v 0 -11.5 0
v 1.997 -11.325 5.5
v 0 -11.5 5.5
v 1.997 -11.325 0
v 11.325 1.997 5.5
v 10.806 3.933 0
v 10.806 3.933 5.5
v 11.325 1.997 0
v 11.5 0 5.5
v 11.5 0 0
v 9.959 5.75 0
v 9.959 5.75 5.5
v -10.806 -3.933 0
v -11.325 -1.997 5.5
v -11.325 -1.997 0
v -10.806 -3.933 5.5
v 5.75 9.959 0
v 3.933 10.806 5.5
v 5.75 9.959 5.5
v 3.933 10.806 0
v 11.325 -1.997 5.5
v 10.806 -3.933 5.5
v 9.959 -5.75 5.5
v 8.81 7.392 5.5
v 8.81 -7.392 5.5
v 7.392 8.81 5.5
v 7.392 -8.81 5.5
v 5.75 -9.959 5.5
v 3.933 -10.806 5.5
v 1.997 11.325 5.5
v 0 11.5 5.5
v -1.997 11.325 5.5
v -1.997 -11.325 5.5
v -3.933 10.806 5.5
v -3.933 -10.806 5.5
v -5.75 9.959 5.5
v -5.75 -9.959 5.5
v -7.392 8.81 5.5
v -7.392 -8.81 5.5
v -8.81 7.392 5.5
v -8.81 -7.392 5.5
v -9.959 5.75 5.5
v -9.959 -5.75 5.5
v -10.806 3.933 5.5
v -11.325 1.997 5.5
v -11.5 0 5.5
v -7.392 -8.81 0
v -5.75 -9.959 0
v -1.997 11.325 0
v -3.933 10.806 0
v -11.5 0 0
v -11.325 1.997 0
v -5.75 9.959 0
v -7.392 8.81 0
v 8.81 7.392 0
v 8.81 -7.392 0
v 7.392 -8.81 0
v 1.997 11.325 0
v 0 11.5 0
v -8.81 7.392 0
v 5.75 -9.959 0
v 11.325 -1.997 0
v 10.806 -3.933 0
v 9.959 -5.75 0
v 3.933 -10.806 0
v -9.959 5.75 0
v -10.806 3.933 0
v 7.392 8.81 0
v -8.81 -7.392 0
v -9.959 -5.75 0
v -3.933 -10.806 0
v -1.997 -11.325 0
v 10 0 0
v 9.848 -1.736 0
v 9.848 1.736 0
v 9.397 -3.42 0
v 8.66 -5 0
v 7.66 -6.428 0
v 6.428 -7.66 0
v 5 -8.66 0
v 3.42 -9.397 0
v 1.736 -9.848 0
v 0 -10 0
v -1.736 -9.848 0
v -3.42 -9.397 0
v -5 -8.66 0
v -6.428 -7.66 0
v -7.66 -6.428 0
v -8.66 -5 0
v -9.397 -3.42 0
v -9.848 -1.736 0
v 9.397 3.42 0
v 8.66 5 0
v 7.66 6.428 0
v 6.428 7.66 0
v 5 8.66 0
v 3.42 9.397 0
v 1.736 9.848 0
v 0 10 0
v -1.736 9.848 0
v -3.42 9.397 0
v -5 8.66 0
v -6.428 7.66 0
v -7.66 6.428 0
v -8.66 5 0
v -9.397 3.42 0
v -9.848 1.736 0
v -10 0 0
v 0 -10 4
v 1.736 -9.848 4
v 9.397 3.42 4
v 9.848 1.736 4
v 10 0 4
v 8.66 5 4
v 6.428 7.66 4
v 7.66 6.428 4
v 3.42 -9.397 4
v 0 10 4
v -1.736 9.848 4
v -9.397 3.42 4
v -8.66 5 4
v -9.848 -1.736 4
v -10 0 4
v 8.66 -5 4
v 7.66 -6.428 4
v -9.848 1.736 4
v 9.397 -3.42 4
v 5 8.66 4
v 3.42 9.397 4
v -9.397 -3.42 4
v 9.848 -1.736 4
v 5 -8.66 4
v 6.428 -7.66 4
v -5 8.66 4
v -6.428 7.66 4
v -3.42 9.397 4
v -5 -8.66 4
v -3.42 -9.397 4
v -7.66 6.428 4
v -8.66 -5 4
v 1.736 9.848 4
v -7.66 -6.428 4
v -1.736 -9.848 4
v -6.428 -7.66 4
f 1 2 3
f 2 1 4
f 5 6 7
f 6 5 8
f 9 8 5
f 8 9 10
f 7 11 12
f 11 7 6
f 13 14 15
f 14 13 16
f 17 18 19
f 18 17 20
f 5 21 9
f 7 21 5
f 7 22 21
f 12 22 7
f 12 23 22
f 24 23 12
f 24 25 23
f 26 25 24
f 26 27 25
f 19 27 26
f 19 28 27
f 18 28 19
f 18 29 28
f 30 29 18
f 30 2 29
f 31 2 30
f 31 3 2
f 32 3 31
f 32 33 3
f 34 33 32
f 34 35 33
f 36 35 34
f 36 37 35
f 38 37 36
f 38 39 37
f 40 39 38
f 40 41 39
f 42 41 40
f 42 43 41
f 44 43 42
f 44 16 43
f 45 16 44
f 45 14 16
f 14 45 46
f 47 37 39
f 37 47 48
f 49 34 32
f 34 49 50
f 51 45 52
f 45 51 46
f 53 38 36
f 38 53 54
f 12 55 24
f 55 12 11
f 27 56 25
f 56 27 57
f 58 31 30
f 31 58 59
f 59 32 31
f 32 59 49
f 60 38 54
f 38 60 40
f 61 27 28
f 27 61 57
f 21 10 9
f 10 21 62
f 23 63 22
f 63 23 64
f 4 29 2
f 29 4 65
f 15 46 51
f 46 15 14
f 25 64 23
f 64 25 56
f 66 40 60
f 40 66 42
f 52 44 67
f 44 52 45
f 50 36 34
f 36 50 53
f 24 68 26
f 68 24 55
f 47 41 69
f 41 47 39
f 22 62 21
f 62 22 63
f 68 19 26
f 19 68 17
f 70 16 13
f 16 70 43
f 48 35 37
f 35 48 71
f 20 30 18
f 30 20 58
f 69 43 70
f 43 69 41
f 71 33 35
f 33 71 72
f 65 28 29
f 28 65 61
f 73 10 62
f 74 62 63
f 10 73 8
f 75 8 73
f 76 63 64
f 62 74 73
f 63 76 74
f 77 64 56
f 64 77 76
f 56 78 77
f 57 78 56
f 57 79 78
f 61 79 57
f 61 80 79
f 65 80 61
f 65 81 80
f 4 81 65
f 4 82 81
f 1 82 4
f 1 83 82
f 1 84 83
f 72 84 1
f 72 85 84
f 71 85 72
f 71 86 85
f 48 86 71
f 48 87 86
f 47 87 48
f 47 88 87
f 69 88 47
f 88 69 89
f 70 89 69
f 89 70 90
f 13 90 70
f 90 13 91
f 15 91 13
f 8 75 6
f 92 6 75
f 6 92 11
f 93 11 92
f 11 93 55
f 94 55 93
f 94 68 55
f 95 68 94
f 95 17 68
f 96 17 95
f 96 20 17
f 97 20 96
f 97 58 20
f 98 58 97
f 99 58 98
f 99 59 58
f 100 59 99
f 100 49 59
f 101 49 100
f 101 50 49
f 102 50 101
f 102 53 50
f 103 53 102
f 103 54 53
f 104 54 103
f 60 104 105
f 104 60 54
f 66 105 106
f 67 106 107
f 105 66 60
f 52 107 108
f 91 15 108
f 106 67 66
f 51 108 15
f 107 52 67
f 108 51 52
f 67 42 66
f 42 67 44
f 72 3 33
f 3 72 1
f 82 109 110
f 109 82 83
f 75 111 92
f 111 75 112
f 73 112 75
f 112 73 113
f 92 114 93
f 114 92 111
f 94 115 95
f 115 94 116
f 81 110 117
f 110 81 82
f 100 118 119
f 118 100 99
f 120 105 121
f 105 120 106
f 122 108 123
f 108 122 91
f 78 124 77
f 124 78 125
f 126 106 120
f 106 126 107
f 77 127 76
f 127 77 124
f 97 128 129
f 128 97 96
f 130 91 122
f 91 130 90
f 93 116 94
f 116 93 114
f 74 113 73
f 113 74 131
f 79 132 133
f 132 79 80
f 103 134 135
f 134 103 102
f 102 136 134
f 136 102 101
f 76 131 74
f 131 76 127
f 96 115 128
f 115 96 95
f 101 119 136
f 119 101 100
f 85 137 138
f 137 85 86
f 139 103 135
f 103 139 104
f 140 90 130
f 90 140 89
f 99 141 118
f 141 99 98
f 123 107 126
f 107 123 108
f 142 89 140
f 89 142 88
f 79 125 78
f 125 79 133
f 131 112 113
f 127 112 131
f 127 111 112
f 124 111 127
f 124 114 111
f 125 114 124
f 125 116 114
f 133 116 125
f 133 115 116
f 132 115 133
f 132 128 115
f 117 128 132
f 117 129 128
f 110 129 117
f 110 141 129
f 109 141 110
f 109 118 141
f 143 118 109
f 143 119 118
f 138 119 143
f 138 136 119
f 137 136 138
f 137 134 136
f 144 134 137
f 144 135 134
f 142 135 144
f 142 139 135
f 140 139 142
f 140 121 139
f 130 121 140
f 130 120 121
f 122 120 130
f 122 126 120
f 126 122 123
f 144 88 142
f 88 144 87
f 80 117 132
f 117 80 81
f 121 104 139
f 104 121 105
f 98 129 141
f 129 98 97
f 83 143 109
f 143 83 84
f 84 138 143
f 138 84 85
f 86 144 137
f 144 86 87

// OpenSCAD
$fn=36;

//Thickness Magnet
tm=4;
//Durchmesser Magnet
dm=20;

//Das ist der Magnet
//cylinder(h=tm, d=dm);

//Jetzt ne Hülle

//Dicke aussenrum
//da=1.xyz //je nach Slicer Vorschlägen

da=1.5;

//       Hülle hohl = 
difference()
{
    //   Hülle vollausgefüllt
    cylinder(h=tm+da, d=dm+da*2);
    // - Magnet (siehe auch oben)
    cylinder(h=tm, d=dm);
}
